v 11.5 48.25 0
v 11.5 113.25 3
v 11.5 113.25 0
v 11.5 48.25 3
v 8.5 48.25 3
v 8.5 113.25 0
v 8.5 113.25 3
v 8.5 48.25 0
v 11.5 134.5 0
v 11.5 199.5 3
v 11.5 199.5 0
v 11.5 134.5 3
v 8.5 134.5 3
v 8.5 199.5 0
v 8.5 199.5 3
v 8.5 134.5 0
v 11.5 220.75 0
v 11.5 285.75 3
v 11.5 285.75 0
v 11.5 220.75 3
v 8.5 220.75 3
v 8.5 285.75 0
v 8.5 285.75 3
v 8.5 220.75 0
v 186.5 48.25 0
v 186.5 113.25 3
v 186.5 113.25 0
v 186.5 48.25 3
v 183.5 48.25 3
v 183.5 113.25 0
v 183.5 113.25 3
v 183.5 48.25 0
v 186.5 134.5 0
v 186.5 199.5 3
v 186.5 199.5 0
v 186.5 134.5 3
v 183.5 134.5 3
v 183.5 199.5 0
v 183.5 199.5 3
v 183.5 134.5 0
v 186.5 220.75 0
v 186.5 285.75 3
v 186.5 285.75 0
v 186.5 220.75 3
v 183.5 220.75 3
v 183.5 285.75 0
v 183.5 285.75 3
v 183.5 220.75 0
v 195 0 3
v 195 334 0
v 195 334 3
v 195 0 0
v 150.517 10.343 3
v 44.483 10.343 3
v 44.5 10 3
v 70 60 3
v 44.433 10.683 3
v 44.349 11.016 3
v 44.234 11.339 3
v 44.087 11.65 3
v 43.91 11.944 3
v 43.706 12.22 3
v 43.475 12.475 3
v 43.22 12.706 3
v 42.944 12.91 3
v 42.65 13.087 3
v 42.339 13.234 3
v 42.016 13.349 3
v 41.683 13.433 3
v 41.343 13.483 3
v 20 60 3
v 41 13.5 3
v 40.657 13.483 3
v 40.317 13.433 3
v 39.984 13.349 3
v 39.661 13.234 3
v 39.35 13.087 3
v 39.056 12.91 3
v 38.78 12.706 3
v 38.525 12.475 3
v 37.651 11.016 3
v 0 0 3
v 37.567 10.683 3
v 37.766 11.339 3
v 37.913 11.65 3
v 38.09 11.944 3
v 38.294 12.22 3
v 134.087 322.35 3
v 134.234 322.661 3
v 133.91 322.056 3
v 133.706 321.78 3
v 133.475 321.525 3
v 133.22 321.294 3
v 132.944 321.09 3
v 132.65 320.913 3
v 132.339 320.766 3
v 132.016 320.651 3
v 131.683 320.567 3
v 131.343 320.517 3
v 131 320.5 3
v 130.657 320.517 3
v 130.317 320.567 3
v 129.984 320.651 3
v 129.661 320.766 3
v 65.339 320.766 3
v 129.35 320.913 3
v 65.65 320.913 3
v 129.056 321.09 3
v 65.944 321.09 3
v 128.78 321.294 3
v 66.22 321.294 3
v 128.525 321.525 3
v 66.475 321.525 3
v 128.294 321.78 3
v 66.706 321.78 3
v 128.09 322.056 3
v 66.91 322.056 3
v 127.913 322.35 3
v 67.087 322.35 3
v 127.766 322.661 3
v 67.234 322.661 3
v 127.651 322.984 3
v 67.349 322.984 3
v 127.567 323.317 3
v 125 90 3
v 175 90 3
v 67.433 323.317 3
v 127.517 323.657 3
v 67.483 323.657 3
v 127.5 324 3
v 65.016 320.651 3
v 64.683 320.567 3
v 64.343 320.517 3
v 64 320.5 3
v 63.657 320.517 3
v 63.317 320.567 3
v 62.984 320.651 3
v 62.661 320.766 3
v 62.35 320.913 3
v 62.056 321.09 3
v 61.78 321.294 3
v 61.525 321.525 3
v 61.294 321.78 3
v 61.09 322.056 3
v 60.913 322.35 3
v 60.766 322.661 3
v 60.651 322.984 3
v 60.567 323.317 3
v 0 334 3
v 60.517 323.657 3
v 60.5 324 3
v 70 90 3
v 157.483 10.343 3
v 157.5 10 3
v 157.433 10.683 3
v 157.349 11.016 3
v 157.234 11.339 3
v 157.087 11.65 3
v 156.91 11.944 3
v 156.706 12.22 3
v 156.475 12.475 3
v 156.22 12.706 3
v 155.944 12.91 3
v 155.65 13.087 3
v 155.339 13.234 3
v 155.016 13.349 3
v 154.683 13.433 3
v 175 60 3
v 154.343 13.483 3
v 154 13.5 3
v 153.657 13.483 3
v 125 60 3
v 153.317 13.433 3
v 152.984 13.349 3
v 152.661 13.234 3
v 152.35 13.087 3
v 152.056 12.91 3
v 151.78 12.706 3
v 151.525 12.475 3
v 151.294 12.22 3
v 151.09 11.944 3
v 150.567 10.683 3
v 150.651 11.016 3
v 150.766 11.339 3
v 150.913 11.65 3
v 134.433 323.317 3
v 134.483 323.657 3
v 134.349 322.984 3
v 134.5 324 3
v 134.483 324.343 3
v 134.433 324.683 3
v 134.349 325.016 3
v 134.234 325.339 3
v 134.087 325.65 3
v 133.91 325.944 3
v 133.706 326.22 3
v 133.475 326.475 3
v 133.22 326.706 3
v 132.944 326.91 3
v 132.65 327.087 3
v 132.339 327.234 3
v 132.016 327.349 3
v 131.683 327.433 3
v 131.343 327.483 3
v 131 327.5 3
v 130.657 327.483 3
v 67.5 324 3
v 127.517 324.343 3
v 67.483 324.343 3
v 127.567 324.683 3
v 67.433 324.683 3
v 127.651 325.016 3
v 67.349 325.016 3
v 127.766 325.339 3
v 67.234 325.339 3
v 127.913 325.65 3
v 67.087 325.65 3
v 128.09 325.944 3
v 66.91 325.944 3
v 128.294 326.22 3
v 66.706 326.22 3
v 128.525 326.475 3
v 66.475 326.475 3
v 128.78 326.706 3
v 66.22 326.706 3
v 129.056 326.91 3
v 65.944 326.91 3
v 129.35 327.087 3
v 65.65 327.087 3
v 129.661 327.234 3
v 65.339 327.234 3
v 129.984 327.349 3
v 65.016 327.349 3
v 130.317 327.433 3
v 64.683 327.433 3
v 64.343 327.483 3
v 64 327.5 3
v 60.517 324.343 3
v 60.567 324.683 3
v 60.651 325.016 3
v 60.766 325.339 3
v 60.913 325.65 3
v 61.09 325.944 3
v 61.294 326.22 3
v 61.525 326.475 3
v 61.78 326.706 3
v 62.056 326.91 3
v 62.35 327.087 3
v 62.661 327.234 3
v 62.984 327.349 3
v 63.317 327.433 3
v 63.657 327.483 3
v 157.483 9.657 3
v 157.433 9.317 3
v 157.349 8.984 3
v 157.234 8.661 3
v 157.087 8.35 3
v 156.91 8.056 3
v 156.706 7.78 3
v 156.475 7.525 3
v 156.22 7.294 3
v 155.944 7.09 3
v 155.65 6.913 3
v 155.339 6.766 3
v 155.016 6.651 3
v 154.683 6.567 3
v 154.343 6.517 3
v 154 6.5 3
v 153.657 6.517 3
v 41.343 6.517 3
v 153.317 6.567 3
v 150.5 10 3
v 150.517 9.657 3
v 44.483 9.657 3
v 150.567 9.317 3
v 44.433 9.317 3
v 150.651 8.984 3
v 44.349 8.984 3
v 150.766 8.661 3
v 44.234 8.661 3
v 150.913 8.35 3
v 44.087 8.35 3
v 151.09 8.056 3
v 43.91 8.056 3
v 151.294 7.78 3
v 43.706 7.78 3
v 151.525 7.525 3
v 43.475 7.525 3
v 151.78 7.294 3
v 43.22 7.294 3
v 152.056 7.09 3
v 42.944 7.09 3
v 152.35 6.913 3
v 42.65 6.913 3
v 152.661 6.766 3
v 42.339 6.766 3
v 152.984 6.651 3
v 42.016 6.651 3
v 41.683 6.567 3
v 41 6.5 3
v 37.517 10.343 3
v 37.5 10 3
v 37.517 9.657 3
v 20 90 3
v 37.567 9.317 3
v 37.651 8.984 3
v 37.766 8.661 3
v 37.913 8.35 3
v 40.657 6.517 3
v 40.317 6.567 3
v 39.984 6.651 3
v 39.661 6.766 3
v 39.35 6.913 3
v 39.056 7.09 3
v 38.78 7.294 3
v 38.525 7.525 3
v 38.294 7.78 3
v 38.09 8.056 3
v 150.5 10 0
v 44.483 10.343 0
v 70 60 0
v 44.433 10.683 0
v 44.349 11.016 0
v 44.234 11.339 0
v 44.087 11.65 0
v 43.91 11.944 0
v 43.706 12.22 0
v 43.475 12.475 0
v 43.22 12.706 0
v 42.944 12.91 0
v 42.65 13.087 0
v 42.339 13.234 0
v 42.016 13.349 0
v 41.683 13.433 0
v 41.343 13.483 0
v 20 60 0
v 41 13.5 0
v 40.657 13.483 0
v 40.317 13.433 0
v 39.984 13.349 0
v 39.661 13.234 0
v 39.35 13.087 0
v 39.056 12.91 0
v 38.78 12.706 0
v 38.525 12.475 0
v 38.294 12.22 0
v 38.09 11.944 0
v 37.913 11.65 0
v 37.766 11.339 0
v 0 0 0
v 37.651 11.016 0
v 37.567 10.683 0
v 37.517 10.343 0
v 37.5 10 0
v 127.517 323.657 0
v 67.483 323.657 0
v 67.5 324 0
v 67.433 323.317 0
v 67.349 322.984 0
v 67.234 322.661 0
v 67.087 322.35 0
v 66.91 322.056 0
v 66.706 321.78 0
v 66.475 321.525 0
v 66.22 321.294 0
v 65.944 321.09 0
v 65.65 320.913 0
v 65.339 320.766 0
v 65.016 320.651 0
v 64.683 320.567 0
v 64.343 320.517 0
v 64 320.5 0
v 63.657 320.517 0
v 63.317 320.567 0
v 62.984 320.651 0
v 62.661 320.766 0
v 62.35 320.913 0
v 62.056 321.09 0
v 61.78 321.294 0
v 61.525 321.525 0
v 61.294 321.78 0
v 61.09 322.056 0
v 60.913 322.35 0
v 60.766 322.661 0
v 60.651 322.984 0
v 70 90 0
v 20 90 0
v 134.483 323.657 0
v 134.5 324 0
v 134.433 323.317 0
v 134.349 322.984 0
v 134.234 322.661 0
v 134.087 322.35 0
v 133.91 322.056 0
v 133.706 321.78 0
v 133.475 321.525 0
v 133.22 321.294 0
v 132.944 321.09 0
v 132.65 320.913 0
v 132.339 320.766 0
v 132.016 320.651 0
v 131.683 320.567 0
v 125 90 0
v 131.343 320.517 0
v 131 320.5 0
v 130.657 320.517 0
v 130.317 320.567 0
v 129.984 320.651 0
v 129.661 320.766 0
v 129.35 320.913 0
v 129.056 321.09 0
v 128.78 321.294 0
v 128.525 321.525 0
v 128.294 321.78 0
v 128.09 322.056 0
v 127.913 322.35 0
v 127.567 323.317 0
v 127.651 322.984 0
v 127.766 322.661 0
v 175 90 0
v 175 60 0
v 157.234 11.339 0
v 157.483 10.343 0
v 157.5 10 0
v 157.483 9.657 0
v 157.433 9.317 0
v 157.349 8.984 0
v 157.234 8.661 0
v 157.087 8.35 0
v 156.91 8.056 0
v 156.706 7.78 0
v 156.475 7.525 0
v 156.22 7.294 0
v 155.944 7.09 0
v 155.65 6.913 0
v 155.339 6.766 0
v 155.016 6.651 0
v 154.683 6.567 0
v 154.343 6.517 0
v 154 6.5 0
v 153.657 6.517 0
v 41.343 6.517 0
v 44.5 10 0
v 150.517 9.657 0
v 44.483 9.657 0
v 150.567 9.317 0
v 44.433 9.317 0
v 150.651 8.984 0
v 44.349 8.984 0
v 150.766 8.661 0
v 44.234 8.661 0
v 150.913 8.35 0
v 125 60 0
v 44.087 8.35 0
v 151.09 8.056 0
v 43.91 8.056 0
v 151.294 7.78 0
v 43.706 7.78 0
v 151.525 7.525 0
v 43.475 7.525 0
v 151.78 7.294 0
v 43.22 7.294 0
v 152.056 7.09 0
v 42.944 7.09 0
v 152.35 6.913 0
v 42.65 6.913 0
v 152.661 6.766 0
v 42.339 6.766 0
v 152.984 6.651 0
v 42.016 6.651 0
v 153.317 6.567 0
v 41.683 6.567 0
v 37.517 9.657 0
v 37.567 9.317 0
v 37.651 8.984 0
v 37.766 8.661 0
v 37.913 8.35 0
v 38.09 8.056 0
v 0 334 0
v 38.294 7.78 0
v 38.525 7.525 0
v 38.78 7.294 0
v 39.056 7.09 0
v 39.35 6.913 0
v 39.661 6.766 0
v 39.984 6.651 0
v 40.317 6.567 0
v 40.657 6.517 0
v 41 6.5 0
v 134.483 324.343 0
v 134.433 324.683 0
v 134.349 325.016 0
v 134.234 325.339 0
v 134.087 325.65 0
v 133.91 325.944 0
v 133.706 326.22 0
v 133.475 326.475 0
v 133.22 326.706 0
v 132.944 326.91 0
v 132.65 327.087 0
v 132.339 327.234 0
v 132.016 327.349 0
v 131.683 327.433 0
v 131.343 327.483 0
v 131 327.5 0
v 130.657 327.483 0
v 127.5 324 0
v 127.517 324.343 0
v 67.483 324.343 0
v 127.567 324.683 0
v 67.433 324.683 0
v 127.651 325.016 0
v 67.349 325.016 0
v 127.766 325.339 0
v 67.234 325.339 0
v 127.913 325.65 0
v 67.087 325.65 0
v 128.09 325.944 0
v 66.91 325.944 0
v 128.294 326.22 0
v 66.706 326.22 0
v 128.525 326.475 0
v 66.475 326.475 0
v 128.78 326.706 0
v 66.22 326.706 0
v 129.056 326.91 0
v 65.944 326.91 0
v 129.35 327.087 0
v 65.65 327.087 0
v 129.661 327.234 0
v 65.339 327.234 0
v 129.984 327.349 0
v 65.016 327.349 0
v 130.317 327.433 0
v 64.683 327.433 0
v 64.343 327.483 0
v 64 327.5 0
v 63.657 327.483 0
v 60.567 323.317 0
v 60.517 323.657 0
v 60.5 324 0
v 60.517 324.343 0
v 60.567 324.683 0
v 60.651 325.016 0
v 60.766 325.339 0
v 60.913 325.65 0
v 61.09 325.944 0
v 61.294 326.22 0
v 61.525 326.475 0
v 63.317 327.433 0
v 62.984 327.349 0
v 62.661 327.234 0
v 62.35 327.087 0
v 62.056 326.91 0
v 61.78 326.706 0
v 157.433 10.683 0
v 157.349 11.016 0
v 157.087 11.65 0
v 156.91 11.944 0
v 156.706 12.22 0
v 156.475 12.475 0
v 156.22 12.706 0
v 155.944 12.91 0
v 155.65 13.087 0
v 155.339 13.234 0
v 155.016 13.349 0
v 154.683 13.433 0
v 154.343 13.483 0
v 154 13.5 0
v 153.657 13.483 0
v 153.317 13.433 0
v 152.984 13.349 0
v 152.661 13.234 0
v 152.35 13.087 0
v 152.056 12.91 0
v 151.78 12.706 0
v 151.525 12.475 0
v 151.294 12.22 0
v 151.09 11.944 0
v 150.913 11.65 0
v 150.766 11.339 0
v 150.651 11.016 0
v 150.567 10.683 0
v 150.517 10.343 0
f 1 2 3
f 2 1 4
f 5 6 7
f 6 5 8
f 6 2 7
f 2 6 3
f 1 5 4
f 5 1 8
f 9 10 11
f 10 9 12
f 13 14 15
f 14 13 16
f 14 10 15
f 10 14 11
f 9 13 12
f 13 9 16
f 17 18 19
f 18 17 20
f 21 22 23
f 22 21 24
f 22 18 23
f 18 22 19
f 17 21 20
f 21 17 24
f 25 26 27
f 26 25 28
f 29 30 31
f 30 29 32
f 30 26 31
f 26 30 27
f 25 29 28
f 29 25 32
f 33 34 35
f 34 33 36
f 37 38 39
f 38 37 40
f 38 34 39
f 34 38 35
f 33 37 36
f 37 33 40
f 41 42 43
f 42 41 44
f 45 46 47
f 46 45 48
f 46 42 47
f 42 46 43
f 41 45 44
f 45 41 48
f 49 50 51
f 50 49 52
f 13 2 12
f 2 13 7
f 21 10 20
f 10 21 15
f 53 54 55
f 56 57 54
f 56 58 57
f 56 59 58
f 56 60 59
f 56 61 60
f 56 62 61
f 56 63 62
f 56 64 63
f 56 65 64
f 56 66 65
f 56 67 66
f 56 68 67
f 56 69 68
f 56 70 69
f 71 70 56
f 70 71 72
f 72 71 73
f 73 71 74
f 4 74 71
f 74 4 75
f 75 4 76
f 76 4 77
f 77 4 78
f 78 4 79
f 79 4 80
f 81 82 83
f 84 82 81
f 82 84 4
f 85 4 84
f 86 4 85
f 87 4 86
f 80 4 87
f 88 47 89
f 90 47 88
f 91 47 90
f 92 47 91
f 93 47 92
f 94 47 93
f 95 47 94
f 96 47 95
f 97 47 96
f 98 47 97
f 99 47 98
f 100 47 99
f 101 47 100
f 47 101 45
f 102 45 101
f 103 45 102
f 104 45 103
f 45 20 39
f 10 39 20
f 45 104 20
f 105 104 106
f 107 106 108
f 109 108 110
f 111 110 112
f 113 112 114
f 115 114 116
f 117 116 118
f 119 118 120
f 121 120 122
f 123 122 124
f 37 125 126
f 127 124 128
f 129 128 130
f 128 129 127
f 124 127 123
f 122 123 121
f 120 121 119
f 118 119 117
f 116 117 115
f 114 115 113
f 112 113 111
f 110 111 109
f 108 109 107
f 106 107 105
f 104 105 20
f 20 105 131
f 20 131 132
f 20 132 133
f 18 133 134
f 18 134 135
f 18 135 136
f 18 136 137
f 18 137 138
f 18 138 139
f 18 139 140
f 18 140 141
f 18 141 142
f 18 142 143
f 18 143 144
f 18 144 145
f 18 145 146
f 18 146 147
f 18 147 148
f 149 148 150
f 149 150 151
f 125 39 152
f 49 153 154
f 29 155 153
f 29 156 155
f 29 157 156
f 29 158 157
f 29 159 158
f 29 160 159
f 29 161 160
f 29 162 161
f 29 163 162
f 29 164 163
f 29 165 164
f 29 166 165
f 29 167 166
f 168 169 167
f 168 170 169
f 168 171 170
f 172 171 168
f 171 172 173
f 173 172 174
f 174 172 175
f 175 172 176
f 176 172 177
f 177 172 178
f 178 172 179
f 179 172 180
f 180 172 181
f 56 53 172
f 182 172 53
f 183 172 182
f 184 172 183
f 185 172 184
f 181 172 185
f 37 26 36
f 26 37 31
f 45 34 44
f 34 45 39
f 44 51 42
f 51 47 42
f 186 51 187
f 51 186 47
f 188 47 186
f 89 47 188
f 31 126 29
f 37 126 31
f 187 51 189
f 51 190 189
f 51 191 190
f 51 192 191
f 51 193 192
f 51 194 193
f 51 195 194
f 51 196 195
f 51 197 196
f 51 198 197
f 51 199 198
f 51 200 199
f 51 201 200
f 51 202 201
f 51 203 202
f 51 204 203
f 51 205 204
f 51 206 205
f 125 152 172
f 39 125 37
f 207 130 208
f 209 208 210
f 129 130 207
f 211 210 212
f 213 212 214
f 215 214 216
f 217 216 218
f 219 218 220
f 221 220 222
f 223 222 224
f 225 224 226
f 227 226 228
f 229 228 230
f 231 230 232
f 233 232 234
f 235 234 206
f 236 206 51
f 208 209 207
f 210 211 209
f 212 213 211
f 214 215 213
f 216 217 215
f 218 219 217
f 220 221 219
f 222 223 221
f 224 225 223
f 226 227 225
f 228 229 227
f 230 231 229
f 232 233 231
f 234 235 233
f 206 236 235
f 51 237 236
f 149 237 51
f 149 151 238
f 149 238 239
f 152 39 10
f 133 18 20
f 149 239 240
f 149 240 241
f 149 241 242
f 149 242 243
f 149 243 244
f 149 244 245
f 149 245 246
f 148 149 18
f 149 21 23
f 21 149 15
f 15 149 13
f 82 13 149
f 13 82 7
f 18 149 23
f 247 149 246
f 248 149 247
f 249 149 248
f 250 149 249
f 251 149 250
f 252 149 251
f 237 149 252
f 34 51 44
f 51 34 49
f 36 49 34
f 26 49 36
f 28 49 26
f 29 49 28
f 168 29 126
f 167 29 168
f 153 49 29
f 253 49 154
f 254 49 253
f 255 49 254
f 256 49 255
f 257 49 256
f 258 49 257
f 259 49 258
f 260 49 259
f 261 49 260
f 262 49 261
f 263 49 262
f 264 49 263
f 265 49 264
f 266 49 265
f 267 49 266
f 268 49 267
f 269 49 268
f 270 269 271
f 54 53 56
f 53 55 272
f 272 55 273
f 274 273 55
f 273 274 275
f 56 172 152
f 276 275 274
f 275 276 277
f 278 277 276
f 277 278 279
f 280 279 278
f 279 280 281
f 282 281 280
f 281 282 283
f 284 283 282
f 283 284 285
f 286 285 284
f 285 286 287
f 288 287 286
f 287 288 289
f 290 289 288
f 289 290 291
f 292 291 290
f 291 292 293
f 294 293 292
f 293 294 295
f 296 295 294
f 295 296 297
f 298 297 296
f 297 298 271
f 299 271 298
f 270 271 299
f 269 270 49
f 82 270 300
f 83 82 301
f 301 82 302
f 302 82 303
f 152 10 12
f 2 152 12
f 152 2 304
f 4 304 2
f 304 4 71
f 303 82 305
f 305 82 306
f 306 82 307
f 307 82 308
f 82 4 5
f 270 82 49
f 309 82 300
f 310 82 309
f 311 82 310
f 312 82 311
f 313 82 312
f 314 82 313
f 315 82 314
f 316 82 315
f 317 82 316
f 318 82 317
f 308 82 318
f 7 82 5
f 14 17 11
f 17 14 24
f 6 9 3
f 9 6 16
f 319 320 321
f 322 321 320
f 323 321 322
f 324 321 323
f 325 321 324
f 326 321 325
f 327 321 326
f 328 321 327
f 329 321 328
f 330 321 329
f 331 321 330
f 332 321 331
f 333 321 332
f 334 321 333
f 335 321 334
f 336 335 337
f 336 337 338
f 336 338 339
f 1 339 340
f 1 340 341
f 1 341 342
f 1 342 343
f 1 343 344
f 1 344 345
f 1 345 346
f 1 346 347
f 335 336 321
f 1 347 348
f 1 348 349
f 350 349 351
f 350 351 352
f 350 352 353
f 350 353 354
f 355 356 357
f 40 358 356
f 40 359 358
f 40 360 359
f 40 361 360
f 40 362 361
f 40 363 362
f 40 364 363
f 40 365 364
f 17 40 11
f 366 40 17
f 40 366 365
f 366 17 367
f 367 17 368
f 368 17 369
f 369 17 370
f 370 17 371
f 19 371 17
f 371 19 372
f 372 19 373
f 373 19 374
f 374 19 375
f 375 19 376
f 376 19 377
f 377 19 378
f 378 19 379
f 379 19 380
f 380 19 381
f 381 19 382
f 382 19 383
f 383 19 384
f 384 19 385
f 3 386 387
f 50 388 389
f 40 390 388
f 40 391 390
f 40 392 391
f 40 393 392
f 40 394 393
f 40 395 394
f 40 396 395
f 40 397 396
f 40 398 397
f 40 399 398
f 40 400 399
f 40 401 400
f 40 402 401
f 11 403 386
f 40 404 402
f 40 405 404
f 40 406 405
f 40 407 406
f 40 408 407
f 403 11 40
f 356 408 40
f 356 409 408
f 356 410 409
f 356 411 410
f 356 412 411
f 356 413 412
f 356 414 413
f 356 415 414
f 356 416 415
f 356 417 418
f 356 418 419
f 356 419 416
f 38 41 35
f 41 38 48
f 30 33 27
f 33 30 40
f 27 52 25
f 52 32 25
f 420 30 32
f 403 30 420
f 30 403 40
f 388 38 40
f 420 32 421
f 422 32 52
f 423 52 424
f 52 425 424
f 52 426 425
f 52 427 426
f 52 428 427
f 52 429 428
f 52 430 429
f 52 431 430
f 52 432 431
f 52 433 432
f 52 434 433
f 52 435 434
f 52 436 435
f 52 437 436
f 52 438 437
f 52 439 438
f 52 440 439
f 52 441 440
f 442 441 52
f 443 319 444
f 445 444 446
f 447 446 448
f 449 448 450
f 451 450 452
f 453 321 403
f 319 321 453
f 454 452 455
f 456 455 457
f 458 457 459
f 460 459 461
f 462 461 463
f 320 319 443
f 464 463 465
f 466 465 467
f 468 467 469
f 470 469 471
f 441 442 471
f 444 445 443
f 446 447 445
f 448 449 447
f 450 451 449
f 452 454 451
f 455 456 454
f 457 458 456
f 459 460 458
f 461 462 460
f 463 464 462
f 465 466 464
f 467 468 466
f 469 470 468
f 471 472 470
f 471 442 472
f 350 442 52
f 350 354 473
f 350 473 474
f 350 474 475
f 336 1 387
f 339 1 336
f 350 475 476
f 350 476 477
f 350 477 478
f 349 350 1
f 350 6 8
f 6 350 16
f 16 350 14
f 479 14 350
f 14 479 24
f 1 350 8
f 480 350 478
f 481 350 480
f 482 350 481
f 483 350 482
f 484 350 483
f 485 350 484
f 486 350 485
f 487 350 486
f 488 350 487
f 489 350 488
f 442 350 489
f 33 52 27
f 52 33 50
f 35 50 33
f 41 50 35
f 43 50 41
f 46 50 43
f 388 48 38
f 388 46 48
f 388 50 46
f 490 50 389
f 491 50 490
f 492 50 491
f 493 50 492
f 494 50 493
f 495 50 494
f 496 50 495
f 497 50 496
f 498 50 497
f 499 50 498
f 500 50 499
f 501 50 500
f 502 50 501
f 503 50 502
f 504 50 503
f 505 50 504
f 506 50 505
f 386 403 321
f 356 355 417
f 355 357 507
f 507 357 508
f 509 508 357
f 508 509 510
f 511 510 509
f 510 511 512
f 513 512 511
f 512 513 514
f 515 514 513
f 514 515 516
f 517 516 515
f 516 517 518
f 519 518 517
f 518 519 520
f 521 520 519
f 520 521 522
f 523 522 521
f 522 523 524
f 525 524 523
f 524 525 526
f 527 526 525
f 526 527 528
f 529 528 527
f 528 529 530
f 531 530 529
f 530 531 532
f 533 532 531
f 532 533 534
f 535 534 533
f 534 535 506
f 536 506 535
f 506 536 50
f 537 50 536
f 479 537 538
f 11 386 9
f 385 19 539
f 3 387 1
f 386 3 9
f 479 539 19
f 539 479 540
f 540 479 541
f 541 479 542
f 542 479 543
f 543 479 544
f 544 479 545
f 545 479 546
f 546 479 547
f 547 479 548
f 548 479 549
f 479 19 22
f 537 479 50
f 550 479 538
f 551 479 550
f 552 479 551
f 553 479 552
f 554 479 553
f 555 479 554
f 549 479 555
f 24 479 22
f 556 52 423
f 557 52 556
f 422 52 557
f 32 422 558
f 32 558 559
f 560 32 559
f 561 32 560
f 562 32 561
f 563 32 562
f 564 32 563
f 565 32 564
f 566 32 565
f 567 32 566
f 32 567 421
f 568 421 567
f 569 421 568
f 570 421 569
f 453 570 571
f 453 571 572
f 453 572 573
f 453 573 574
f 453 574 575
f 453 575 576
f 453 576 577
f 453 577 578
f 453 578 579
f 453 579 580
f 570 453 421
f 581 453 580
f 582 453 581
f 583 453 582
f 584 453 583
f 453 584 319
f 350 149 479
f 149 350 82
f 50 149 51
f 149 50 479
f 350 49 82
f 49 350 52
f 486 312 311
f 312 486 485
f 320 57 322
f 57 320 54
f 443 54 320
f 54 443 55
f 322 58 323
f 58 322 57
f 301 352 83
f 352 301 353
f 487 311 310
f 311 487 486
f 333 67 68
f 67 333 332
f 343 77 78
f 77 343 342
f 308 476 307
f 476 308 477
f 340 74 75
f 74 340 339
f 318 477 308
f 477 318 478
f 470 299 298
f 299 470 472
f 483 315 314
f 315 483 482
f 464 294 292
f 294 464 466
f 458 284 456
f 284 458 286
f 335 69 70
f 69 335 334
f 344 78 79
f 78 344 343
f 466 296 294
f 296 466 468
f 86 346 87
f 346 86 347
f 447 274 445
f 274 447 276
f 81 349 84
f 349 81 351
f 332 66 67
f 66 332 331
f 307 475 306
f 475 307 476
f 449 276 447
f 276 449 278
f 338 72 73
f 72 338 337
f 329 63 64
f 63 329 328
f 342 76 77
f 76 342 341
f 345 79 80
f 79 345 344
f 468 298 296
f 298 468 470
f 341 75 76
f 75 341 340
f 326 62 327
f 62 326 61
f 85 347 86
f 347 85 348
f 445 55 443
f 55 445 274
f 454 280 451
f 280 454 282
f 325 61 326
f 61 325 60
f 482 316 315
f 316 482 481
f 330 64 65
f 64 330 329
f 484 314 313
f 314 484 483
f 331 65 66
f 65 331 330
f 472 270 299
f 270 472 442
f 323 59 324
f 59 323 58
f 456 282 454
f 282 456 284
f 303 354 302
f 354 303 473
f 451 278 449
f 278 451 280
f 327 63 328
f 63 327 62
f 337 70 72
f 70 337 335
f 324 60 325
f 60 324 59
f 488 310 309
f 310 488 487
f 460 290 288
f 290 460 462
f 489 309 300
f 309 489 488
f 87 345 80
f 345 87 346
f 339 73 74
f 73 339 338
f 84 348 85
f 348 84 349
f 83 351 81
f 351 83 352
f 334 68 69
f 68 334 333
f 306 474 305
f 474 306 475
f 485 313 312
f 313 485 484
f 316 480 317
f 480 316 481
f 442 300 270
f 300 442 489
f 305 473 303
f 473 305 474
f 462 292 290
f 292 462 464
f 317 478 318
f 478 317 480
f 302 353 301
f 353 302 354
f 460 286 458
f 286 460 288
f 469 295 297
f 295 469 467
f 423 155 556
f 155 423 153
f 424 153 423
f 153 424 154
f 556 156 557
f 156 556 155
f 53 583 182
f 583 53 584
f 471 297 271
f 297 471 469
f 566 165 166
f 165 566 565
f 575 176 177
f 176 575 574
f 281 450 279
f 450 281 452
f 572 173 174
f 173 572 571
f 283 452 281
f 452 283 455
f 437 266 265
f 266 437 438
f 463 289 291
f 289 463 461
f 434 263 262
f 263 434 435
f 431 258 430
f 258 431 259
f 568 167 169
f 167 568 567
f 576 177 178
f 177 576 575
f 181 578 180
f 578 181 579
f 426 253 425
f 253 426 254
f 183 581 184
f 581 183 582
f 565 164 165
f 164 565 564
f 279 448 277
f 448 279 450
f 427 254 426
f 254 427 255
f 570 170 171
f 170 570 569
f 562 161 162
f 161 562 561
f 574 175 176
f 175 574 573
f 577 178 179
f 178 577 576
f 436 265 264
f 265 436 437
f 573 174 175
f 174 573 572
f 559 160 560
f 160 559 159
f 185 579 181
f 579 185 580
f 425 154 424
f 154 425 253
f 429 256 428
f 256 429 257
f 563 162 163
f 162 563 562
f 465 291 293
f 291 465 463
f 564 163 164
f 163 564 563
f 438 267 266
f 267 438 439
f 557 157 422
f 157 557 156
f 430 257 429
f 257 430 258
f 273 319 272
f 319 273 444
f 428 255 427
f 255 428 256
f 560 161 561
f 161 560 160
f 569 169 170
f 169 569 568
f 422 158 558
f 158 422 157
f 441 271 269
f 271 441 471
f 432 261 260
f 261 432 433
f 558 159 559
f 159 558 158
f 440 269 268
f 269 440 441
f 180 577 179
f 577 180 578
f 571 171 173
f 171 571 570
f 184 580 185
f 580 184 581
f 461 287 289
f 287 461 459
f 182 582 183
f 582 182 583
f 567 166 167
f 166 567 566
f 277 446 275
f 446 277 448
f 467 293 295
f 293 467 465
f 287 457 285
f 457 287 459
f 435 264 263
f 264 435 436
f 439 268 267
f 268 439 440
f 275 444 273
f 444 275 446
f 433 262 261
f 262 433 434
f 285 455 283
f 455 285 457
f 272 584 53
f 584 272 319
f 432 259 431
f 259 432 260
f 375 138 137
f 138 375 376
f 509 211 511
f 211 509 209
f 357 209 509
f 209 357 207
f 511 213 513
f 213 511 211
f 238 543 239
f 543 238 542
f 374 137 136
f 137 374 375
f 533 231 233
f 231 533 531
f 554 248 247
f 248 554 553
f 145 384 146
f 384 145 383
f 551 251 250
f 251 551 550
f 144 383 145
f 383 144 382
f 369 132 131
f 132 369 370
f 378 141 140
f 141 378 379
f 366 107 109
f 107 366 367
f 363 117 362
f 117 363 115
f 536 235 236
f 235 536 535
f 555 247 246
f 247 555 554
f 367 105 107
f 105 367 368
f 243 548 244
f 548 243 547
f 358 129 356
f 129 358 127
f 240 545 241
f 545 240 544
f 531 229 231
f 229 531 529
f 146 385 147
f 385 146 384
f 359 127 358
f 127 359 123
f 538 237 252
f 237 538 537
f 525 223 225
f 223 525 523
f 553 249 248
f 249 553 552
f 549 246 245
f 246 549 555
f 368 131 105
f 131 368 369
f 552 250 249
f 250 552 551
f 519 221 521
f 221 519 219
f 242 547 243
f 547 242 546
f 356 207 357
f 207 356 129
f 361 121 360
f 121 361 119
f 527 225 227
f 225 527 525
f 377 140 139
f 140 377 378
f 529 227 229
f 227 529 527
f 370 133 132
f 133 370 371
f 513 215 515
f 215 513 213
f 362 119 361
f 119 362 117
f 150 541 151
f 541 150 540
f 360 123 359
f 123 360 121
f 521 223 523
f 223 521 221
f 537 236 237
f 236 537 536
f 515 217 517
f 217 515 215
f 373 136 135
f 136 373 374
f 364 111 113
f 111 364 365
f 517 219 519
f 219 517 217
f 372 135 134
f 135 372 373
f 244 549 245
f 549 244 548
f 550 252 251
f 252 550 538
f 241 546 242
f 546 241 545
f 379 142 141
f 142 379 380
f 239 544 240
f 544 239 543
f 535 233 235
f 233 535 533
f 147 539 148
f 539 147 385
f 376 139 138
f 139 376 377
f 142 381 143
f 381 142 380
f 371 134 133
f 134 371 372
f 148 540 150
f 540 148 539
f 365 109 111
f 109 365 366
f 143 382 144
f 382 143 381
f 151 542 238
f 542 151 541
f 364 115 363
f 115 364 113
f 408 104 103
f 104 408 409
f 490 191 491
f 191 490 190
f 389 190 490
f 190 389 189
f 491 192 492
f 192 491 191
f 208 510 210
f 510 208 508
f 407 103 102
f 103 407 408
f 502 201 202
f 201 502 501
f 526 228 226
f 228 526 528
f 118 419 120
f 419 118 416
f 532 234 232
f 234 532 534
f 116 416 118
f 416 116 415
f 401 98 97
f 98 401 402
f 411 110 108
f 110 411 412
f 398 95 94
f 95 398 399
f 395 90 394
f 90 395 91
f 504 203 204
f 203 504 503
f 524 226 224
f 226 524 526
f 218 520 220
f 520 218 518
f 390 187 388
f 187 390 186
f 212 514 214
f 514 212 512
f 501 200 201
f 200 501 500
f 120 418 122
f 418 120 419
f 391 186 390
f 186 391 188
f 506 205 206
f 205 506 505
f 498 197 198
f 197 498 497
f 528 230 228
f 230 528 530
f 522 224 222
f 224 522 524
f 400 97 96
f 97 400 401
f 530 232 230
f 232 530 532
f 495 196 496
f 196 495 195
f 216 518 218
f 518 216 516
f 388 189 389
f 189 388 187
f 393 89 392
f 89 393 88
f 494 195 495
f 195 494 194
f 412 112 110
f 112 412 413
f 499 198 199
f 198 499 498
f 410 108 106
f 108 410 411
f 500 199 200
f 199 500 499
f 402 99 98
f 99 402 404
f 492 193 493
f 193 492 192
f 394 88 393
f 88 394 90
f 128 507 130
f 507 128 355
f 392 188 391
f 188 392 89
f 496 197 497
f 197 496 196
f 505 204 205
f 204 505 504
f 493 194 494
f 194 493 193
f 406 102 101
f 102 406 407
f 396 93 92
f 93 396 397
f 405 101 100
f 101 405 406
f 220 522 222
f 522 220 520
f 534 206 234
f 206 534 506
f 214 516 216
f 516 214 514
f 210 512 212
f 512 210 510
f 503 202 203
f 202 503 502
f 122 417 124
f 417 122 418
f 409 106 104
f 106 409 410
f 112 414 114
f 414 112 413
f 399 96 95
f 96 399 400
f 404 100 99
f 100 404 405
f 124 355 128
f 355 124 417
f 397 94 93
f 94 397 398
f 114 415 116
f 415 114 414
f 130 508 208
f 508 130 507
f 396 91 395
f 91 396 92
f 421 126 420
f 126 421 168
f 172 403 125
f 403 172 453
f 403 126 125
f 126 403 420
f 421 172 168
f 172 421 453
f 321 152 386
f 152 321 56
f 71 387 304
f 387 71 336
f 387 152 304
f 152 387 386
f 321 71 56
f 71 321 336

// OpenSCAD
// DRC Frame Plate
// Units: mm

$fn = 64;

// Plate dimensions
plate_length = 314 + 10 + 10;   // 334 mm total
plate_width  = 195;
plate_thick  = 3;

// Hole dimensions
hole_diameter = 7.0;
hole_radius   = hole_diameter / 2;

// Hole offsets from the left/right edges
side_a_x_offset = 37.5 + hole_radius;  // 40.75 mm
side_b_x_offset = 60.5 + hole_radius;  // 65.75 mm

// Distance of holes inward from each long side
// Change this if your holes need to be further in/out.
hole_y_inset = 10;


// Row of rectangular holes spaced evenly along Y
module rectangular_hole_row(
    x_center,
    y_start,
    row_length = 280,
    hole_width = 3,
    hole_length = 65,
    hole_count = 3
) {
    gap = (row_length - hole_count * hole_length) / (hole_count + 1);

    for (i = [0 : hole_count - 1]) {
        y_pos = y_start + gap + i * (hole_length + gap);

        translate([
            x_center - hole_width / 2,
            y_pos,
            -1
        ])
            cube([
                hole_width,
                hole_length,
                plate_thick + 2
            ], center = false);
    }
}

// Main model
difference() {
    // Base rectangular plate
    cube([plate_width, plate_length, plate_thick], center = false);

    // Side A holes
    // Near y = 0 side
    translate([side_a_x_offset, hole_y_inset, -1])
        cylinder(h = plate_thick + 2, d = hole_diameter);

    translate([plate_width - side_a_x_offset, hole_y_inset, -1])
        cylinder(h = plate_thick + 2, d = hole_diameter);

    // Side B holes
    // Near y = plate_width side
    translate([side_b_x_offset, plate_length - hole_y_inset, -1])
        cylinder(h = plate_thick + 2, d = hole_diameter);

    translate([plate_width - side_b_x_offset, plate_length - hole_y_inset, -1])
        cylinder(h = plate_thick + 2, d = hole_diameter);
    
    // Cube hole for cables
    translate([plate_width - 20 - 50 , 60 , -1])
        cube([50, 30, plate_thick+2], center = false);
    
    // Cube hole for cables  
    translate([20, 60 , -1])
        cube([50, 30, plate_thick+2], center = false);
    
    // Row of 3 rectangular holes
    rectangular_hole_row(x_center = 10 , y_start = 27);
    
    // Row of 3 rectangular holes
    rectangular_hole_row(x_center = plate_width - 10 , y_start = 27);
}
